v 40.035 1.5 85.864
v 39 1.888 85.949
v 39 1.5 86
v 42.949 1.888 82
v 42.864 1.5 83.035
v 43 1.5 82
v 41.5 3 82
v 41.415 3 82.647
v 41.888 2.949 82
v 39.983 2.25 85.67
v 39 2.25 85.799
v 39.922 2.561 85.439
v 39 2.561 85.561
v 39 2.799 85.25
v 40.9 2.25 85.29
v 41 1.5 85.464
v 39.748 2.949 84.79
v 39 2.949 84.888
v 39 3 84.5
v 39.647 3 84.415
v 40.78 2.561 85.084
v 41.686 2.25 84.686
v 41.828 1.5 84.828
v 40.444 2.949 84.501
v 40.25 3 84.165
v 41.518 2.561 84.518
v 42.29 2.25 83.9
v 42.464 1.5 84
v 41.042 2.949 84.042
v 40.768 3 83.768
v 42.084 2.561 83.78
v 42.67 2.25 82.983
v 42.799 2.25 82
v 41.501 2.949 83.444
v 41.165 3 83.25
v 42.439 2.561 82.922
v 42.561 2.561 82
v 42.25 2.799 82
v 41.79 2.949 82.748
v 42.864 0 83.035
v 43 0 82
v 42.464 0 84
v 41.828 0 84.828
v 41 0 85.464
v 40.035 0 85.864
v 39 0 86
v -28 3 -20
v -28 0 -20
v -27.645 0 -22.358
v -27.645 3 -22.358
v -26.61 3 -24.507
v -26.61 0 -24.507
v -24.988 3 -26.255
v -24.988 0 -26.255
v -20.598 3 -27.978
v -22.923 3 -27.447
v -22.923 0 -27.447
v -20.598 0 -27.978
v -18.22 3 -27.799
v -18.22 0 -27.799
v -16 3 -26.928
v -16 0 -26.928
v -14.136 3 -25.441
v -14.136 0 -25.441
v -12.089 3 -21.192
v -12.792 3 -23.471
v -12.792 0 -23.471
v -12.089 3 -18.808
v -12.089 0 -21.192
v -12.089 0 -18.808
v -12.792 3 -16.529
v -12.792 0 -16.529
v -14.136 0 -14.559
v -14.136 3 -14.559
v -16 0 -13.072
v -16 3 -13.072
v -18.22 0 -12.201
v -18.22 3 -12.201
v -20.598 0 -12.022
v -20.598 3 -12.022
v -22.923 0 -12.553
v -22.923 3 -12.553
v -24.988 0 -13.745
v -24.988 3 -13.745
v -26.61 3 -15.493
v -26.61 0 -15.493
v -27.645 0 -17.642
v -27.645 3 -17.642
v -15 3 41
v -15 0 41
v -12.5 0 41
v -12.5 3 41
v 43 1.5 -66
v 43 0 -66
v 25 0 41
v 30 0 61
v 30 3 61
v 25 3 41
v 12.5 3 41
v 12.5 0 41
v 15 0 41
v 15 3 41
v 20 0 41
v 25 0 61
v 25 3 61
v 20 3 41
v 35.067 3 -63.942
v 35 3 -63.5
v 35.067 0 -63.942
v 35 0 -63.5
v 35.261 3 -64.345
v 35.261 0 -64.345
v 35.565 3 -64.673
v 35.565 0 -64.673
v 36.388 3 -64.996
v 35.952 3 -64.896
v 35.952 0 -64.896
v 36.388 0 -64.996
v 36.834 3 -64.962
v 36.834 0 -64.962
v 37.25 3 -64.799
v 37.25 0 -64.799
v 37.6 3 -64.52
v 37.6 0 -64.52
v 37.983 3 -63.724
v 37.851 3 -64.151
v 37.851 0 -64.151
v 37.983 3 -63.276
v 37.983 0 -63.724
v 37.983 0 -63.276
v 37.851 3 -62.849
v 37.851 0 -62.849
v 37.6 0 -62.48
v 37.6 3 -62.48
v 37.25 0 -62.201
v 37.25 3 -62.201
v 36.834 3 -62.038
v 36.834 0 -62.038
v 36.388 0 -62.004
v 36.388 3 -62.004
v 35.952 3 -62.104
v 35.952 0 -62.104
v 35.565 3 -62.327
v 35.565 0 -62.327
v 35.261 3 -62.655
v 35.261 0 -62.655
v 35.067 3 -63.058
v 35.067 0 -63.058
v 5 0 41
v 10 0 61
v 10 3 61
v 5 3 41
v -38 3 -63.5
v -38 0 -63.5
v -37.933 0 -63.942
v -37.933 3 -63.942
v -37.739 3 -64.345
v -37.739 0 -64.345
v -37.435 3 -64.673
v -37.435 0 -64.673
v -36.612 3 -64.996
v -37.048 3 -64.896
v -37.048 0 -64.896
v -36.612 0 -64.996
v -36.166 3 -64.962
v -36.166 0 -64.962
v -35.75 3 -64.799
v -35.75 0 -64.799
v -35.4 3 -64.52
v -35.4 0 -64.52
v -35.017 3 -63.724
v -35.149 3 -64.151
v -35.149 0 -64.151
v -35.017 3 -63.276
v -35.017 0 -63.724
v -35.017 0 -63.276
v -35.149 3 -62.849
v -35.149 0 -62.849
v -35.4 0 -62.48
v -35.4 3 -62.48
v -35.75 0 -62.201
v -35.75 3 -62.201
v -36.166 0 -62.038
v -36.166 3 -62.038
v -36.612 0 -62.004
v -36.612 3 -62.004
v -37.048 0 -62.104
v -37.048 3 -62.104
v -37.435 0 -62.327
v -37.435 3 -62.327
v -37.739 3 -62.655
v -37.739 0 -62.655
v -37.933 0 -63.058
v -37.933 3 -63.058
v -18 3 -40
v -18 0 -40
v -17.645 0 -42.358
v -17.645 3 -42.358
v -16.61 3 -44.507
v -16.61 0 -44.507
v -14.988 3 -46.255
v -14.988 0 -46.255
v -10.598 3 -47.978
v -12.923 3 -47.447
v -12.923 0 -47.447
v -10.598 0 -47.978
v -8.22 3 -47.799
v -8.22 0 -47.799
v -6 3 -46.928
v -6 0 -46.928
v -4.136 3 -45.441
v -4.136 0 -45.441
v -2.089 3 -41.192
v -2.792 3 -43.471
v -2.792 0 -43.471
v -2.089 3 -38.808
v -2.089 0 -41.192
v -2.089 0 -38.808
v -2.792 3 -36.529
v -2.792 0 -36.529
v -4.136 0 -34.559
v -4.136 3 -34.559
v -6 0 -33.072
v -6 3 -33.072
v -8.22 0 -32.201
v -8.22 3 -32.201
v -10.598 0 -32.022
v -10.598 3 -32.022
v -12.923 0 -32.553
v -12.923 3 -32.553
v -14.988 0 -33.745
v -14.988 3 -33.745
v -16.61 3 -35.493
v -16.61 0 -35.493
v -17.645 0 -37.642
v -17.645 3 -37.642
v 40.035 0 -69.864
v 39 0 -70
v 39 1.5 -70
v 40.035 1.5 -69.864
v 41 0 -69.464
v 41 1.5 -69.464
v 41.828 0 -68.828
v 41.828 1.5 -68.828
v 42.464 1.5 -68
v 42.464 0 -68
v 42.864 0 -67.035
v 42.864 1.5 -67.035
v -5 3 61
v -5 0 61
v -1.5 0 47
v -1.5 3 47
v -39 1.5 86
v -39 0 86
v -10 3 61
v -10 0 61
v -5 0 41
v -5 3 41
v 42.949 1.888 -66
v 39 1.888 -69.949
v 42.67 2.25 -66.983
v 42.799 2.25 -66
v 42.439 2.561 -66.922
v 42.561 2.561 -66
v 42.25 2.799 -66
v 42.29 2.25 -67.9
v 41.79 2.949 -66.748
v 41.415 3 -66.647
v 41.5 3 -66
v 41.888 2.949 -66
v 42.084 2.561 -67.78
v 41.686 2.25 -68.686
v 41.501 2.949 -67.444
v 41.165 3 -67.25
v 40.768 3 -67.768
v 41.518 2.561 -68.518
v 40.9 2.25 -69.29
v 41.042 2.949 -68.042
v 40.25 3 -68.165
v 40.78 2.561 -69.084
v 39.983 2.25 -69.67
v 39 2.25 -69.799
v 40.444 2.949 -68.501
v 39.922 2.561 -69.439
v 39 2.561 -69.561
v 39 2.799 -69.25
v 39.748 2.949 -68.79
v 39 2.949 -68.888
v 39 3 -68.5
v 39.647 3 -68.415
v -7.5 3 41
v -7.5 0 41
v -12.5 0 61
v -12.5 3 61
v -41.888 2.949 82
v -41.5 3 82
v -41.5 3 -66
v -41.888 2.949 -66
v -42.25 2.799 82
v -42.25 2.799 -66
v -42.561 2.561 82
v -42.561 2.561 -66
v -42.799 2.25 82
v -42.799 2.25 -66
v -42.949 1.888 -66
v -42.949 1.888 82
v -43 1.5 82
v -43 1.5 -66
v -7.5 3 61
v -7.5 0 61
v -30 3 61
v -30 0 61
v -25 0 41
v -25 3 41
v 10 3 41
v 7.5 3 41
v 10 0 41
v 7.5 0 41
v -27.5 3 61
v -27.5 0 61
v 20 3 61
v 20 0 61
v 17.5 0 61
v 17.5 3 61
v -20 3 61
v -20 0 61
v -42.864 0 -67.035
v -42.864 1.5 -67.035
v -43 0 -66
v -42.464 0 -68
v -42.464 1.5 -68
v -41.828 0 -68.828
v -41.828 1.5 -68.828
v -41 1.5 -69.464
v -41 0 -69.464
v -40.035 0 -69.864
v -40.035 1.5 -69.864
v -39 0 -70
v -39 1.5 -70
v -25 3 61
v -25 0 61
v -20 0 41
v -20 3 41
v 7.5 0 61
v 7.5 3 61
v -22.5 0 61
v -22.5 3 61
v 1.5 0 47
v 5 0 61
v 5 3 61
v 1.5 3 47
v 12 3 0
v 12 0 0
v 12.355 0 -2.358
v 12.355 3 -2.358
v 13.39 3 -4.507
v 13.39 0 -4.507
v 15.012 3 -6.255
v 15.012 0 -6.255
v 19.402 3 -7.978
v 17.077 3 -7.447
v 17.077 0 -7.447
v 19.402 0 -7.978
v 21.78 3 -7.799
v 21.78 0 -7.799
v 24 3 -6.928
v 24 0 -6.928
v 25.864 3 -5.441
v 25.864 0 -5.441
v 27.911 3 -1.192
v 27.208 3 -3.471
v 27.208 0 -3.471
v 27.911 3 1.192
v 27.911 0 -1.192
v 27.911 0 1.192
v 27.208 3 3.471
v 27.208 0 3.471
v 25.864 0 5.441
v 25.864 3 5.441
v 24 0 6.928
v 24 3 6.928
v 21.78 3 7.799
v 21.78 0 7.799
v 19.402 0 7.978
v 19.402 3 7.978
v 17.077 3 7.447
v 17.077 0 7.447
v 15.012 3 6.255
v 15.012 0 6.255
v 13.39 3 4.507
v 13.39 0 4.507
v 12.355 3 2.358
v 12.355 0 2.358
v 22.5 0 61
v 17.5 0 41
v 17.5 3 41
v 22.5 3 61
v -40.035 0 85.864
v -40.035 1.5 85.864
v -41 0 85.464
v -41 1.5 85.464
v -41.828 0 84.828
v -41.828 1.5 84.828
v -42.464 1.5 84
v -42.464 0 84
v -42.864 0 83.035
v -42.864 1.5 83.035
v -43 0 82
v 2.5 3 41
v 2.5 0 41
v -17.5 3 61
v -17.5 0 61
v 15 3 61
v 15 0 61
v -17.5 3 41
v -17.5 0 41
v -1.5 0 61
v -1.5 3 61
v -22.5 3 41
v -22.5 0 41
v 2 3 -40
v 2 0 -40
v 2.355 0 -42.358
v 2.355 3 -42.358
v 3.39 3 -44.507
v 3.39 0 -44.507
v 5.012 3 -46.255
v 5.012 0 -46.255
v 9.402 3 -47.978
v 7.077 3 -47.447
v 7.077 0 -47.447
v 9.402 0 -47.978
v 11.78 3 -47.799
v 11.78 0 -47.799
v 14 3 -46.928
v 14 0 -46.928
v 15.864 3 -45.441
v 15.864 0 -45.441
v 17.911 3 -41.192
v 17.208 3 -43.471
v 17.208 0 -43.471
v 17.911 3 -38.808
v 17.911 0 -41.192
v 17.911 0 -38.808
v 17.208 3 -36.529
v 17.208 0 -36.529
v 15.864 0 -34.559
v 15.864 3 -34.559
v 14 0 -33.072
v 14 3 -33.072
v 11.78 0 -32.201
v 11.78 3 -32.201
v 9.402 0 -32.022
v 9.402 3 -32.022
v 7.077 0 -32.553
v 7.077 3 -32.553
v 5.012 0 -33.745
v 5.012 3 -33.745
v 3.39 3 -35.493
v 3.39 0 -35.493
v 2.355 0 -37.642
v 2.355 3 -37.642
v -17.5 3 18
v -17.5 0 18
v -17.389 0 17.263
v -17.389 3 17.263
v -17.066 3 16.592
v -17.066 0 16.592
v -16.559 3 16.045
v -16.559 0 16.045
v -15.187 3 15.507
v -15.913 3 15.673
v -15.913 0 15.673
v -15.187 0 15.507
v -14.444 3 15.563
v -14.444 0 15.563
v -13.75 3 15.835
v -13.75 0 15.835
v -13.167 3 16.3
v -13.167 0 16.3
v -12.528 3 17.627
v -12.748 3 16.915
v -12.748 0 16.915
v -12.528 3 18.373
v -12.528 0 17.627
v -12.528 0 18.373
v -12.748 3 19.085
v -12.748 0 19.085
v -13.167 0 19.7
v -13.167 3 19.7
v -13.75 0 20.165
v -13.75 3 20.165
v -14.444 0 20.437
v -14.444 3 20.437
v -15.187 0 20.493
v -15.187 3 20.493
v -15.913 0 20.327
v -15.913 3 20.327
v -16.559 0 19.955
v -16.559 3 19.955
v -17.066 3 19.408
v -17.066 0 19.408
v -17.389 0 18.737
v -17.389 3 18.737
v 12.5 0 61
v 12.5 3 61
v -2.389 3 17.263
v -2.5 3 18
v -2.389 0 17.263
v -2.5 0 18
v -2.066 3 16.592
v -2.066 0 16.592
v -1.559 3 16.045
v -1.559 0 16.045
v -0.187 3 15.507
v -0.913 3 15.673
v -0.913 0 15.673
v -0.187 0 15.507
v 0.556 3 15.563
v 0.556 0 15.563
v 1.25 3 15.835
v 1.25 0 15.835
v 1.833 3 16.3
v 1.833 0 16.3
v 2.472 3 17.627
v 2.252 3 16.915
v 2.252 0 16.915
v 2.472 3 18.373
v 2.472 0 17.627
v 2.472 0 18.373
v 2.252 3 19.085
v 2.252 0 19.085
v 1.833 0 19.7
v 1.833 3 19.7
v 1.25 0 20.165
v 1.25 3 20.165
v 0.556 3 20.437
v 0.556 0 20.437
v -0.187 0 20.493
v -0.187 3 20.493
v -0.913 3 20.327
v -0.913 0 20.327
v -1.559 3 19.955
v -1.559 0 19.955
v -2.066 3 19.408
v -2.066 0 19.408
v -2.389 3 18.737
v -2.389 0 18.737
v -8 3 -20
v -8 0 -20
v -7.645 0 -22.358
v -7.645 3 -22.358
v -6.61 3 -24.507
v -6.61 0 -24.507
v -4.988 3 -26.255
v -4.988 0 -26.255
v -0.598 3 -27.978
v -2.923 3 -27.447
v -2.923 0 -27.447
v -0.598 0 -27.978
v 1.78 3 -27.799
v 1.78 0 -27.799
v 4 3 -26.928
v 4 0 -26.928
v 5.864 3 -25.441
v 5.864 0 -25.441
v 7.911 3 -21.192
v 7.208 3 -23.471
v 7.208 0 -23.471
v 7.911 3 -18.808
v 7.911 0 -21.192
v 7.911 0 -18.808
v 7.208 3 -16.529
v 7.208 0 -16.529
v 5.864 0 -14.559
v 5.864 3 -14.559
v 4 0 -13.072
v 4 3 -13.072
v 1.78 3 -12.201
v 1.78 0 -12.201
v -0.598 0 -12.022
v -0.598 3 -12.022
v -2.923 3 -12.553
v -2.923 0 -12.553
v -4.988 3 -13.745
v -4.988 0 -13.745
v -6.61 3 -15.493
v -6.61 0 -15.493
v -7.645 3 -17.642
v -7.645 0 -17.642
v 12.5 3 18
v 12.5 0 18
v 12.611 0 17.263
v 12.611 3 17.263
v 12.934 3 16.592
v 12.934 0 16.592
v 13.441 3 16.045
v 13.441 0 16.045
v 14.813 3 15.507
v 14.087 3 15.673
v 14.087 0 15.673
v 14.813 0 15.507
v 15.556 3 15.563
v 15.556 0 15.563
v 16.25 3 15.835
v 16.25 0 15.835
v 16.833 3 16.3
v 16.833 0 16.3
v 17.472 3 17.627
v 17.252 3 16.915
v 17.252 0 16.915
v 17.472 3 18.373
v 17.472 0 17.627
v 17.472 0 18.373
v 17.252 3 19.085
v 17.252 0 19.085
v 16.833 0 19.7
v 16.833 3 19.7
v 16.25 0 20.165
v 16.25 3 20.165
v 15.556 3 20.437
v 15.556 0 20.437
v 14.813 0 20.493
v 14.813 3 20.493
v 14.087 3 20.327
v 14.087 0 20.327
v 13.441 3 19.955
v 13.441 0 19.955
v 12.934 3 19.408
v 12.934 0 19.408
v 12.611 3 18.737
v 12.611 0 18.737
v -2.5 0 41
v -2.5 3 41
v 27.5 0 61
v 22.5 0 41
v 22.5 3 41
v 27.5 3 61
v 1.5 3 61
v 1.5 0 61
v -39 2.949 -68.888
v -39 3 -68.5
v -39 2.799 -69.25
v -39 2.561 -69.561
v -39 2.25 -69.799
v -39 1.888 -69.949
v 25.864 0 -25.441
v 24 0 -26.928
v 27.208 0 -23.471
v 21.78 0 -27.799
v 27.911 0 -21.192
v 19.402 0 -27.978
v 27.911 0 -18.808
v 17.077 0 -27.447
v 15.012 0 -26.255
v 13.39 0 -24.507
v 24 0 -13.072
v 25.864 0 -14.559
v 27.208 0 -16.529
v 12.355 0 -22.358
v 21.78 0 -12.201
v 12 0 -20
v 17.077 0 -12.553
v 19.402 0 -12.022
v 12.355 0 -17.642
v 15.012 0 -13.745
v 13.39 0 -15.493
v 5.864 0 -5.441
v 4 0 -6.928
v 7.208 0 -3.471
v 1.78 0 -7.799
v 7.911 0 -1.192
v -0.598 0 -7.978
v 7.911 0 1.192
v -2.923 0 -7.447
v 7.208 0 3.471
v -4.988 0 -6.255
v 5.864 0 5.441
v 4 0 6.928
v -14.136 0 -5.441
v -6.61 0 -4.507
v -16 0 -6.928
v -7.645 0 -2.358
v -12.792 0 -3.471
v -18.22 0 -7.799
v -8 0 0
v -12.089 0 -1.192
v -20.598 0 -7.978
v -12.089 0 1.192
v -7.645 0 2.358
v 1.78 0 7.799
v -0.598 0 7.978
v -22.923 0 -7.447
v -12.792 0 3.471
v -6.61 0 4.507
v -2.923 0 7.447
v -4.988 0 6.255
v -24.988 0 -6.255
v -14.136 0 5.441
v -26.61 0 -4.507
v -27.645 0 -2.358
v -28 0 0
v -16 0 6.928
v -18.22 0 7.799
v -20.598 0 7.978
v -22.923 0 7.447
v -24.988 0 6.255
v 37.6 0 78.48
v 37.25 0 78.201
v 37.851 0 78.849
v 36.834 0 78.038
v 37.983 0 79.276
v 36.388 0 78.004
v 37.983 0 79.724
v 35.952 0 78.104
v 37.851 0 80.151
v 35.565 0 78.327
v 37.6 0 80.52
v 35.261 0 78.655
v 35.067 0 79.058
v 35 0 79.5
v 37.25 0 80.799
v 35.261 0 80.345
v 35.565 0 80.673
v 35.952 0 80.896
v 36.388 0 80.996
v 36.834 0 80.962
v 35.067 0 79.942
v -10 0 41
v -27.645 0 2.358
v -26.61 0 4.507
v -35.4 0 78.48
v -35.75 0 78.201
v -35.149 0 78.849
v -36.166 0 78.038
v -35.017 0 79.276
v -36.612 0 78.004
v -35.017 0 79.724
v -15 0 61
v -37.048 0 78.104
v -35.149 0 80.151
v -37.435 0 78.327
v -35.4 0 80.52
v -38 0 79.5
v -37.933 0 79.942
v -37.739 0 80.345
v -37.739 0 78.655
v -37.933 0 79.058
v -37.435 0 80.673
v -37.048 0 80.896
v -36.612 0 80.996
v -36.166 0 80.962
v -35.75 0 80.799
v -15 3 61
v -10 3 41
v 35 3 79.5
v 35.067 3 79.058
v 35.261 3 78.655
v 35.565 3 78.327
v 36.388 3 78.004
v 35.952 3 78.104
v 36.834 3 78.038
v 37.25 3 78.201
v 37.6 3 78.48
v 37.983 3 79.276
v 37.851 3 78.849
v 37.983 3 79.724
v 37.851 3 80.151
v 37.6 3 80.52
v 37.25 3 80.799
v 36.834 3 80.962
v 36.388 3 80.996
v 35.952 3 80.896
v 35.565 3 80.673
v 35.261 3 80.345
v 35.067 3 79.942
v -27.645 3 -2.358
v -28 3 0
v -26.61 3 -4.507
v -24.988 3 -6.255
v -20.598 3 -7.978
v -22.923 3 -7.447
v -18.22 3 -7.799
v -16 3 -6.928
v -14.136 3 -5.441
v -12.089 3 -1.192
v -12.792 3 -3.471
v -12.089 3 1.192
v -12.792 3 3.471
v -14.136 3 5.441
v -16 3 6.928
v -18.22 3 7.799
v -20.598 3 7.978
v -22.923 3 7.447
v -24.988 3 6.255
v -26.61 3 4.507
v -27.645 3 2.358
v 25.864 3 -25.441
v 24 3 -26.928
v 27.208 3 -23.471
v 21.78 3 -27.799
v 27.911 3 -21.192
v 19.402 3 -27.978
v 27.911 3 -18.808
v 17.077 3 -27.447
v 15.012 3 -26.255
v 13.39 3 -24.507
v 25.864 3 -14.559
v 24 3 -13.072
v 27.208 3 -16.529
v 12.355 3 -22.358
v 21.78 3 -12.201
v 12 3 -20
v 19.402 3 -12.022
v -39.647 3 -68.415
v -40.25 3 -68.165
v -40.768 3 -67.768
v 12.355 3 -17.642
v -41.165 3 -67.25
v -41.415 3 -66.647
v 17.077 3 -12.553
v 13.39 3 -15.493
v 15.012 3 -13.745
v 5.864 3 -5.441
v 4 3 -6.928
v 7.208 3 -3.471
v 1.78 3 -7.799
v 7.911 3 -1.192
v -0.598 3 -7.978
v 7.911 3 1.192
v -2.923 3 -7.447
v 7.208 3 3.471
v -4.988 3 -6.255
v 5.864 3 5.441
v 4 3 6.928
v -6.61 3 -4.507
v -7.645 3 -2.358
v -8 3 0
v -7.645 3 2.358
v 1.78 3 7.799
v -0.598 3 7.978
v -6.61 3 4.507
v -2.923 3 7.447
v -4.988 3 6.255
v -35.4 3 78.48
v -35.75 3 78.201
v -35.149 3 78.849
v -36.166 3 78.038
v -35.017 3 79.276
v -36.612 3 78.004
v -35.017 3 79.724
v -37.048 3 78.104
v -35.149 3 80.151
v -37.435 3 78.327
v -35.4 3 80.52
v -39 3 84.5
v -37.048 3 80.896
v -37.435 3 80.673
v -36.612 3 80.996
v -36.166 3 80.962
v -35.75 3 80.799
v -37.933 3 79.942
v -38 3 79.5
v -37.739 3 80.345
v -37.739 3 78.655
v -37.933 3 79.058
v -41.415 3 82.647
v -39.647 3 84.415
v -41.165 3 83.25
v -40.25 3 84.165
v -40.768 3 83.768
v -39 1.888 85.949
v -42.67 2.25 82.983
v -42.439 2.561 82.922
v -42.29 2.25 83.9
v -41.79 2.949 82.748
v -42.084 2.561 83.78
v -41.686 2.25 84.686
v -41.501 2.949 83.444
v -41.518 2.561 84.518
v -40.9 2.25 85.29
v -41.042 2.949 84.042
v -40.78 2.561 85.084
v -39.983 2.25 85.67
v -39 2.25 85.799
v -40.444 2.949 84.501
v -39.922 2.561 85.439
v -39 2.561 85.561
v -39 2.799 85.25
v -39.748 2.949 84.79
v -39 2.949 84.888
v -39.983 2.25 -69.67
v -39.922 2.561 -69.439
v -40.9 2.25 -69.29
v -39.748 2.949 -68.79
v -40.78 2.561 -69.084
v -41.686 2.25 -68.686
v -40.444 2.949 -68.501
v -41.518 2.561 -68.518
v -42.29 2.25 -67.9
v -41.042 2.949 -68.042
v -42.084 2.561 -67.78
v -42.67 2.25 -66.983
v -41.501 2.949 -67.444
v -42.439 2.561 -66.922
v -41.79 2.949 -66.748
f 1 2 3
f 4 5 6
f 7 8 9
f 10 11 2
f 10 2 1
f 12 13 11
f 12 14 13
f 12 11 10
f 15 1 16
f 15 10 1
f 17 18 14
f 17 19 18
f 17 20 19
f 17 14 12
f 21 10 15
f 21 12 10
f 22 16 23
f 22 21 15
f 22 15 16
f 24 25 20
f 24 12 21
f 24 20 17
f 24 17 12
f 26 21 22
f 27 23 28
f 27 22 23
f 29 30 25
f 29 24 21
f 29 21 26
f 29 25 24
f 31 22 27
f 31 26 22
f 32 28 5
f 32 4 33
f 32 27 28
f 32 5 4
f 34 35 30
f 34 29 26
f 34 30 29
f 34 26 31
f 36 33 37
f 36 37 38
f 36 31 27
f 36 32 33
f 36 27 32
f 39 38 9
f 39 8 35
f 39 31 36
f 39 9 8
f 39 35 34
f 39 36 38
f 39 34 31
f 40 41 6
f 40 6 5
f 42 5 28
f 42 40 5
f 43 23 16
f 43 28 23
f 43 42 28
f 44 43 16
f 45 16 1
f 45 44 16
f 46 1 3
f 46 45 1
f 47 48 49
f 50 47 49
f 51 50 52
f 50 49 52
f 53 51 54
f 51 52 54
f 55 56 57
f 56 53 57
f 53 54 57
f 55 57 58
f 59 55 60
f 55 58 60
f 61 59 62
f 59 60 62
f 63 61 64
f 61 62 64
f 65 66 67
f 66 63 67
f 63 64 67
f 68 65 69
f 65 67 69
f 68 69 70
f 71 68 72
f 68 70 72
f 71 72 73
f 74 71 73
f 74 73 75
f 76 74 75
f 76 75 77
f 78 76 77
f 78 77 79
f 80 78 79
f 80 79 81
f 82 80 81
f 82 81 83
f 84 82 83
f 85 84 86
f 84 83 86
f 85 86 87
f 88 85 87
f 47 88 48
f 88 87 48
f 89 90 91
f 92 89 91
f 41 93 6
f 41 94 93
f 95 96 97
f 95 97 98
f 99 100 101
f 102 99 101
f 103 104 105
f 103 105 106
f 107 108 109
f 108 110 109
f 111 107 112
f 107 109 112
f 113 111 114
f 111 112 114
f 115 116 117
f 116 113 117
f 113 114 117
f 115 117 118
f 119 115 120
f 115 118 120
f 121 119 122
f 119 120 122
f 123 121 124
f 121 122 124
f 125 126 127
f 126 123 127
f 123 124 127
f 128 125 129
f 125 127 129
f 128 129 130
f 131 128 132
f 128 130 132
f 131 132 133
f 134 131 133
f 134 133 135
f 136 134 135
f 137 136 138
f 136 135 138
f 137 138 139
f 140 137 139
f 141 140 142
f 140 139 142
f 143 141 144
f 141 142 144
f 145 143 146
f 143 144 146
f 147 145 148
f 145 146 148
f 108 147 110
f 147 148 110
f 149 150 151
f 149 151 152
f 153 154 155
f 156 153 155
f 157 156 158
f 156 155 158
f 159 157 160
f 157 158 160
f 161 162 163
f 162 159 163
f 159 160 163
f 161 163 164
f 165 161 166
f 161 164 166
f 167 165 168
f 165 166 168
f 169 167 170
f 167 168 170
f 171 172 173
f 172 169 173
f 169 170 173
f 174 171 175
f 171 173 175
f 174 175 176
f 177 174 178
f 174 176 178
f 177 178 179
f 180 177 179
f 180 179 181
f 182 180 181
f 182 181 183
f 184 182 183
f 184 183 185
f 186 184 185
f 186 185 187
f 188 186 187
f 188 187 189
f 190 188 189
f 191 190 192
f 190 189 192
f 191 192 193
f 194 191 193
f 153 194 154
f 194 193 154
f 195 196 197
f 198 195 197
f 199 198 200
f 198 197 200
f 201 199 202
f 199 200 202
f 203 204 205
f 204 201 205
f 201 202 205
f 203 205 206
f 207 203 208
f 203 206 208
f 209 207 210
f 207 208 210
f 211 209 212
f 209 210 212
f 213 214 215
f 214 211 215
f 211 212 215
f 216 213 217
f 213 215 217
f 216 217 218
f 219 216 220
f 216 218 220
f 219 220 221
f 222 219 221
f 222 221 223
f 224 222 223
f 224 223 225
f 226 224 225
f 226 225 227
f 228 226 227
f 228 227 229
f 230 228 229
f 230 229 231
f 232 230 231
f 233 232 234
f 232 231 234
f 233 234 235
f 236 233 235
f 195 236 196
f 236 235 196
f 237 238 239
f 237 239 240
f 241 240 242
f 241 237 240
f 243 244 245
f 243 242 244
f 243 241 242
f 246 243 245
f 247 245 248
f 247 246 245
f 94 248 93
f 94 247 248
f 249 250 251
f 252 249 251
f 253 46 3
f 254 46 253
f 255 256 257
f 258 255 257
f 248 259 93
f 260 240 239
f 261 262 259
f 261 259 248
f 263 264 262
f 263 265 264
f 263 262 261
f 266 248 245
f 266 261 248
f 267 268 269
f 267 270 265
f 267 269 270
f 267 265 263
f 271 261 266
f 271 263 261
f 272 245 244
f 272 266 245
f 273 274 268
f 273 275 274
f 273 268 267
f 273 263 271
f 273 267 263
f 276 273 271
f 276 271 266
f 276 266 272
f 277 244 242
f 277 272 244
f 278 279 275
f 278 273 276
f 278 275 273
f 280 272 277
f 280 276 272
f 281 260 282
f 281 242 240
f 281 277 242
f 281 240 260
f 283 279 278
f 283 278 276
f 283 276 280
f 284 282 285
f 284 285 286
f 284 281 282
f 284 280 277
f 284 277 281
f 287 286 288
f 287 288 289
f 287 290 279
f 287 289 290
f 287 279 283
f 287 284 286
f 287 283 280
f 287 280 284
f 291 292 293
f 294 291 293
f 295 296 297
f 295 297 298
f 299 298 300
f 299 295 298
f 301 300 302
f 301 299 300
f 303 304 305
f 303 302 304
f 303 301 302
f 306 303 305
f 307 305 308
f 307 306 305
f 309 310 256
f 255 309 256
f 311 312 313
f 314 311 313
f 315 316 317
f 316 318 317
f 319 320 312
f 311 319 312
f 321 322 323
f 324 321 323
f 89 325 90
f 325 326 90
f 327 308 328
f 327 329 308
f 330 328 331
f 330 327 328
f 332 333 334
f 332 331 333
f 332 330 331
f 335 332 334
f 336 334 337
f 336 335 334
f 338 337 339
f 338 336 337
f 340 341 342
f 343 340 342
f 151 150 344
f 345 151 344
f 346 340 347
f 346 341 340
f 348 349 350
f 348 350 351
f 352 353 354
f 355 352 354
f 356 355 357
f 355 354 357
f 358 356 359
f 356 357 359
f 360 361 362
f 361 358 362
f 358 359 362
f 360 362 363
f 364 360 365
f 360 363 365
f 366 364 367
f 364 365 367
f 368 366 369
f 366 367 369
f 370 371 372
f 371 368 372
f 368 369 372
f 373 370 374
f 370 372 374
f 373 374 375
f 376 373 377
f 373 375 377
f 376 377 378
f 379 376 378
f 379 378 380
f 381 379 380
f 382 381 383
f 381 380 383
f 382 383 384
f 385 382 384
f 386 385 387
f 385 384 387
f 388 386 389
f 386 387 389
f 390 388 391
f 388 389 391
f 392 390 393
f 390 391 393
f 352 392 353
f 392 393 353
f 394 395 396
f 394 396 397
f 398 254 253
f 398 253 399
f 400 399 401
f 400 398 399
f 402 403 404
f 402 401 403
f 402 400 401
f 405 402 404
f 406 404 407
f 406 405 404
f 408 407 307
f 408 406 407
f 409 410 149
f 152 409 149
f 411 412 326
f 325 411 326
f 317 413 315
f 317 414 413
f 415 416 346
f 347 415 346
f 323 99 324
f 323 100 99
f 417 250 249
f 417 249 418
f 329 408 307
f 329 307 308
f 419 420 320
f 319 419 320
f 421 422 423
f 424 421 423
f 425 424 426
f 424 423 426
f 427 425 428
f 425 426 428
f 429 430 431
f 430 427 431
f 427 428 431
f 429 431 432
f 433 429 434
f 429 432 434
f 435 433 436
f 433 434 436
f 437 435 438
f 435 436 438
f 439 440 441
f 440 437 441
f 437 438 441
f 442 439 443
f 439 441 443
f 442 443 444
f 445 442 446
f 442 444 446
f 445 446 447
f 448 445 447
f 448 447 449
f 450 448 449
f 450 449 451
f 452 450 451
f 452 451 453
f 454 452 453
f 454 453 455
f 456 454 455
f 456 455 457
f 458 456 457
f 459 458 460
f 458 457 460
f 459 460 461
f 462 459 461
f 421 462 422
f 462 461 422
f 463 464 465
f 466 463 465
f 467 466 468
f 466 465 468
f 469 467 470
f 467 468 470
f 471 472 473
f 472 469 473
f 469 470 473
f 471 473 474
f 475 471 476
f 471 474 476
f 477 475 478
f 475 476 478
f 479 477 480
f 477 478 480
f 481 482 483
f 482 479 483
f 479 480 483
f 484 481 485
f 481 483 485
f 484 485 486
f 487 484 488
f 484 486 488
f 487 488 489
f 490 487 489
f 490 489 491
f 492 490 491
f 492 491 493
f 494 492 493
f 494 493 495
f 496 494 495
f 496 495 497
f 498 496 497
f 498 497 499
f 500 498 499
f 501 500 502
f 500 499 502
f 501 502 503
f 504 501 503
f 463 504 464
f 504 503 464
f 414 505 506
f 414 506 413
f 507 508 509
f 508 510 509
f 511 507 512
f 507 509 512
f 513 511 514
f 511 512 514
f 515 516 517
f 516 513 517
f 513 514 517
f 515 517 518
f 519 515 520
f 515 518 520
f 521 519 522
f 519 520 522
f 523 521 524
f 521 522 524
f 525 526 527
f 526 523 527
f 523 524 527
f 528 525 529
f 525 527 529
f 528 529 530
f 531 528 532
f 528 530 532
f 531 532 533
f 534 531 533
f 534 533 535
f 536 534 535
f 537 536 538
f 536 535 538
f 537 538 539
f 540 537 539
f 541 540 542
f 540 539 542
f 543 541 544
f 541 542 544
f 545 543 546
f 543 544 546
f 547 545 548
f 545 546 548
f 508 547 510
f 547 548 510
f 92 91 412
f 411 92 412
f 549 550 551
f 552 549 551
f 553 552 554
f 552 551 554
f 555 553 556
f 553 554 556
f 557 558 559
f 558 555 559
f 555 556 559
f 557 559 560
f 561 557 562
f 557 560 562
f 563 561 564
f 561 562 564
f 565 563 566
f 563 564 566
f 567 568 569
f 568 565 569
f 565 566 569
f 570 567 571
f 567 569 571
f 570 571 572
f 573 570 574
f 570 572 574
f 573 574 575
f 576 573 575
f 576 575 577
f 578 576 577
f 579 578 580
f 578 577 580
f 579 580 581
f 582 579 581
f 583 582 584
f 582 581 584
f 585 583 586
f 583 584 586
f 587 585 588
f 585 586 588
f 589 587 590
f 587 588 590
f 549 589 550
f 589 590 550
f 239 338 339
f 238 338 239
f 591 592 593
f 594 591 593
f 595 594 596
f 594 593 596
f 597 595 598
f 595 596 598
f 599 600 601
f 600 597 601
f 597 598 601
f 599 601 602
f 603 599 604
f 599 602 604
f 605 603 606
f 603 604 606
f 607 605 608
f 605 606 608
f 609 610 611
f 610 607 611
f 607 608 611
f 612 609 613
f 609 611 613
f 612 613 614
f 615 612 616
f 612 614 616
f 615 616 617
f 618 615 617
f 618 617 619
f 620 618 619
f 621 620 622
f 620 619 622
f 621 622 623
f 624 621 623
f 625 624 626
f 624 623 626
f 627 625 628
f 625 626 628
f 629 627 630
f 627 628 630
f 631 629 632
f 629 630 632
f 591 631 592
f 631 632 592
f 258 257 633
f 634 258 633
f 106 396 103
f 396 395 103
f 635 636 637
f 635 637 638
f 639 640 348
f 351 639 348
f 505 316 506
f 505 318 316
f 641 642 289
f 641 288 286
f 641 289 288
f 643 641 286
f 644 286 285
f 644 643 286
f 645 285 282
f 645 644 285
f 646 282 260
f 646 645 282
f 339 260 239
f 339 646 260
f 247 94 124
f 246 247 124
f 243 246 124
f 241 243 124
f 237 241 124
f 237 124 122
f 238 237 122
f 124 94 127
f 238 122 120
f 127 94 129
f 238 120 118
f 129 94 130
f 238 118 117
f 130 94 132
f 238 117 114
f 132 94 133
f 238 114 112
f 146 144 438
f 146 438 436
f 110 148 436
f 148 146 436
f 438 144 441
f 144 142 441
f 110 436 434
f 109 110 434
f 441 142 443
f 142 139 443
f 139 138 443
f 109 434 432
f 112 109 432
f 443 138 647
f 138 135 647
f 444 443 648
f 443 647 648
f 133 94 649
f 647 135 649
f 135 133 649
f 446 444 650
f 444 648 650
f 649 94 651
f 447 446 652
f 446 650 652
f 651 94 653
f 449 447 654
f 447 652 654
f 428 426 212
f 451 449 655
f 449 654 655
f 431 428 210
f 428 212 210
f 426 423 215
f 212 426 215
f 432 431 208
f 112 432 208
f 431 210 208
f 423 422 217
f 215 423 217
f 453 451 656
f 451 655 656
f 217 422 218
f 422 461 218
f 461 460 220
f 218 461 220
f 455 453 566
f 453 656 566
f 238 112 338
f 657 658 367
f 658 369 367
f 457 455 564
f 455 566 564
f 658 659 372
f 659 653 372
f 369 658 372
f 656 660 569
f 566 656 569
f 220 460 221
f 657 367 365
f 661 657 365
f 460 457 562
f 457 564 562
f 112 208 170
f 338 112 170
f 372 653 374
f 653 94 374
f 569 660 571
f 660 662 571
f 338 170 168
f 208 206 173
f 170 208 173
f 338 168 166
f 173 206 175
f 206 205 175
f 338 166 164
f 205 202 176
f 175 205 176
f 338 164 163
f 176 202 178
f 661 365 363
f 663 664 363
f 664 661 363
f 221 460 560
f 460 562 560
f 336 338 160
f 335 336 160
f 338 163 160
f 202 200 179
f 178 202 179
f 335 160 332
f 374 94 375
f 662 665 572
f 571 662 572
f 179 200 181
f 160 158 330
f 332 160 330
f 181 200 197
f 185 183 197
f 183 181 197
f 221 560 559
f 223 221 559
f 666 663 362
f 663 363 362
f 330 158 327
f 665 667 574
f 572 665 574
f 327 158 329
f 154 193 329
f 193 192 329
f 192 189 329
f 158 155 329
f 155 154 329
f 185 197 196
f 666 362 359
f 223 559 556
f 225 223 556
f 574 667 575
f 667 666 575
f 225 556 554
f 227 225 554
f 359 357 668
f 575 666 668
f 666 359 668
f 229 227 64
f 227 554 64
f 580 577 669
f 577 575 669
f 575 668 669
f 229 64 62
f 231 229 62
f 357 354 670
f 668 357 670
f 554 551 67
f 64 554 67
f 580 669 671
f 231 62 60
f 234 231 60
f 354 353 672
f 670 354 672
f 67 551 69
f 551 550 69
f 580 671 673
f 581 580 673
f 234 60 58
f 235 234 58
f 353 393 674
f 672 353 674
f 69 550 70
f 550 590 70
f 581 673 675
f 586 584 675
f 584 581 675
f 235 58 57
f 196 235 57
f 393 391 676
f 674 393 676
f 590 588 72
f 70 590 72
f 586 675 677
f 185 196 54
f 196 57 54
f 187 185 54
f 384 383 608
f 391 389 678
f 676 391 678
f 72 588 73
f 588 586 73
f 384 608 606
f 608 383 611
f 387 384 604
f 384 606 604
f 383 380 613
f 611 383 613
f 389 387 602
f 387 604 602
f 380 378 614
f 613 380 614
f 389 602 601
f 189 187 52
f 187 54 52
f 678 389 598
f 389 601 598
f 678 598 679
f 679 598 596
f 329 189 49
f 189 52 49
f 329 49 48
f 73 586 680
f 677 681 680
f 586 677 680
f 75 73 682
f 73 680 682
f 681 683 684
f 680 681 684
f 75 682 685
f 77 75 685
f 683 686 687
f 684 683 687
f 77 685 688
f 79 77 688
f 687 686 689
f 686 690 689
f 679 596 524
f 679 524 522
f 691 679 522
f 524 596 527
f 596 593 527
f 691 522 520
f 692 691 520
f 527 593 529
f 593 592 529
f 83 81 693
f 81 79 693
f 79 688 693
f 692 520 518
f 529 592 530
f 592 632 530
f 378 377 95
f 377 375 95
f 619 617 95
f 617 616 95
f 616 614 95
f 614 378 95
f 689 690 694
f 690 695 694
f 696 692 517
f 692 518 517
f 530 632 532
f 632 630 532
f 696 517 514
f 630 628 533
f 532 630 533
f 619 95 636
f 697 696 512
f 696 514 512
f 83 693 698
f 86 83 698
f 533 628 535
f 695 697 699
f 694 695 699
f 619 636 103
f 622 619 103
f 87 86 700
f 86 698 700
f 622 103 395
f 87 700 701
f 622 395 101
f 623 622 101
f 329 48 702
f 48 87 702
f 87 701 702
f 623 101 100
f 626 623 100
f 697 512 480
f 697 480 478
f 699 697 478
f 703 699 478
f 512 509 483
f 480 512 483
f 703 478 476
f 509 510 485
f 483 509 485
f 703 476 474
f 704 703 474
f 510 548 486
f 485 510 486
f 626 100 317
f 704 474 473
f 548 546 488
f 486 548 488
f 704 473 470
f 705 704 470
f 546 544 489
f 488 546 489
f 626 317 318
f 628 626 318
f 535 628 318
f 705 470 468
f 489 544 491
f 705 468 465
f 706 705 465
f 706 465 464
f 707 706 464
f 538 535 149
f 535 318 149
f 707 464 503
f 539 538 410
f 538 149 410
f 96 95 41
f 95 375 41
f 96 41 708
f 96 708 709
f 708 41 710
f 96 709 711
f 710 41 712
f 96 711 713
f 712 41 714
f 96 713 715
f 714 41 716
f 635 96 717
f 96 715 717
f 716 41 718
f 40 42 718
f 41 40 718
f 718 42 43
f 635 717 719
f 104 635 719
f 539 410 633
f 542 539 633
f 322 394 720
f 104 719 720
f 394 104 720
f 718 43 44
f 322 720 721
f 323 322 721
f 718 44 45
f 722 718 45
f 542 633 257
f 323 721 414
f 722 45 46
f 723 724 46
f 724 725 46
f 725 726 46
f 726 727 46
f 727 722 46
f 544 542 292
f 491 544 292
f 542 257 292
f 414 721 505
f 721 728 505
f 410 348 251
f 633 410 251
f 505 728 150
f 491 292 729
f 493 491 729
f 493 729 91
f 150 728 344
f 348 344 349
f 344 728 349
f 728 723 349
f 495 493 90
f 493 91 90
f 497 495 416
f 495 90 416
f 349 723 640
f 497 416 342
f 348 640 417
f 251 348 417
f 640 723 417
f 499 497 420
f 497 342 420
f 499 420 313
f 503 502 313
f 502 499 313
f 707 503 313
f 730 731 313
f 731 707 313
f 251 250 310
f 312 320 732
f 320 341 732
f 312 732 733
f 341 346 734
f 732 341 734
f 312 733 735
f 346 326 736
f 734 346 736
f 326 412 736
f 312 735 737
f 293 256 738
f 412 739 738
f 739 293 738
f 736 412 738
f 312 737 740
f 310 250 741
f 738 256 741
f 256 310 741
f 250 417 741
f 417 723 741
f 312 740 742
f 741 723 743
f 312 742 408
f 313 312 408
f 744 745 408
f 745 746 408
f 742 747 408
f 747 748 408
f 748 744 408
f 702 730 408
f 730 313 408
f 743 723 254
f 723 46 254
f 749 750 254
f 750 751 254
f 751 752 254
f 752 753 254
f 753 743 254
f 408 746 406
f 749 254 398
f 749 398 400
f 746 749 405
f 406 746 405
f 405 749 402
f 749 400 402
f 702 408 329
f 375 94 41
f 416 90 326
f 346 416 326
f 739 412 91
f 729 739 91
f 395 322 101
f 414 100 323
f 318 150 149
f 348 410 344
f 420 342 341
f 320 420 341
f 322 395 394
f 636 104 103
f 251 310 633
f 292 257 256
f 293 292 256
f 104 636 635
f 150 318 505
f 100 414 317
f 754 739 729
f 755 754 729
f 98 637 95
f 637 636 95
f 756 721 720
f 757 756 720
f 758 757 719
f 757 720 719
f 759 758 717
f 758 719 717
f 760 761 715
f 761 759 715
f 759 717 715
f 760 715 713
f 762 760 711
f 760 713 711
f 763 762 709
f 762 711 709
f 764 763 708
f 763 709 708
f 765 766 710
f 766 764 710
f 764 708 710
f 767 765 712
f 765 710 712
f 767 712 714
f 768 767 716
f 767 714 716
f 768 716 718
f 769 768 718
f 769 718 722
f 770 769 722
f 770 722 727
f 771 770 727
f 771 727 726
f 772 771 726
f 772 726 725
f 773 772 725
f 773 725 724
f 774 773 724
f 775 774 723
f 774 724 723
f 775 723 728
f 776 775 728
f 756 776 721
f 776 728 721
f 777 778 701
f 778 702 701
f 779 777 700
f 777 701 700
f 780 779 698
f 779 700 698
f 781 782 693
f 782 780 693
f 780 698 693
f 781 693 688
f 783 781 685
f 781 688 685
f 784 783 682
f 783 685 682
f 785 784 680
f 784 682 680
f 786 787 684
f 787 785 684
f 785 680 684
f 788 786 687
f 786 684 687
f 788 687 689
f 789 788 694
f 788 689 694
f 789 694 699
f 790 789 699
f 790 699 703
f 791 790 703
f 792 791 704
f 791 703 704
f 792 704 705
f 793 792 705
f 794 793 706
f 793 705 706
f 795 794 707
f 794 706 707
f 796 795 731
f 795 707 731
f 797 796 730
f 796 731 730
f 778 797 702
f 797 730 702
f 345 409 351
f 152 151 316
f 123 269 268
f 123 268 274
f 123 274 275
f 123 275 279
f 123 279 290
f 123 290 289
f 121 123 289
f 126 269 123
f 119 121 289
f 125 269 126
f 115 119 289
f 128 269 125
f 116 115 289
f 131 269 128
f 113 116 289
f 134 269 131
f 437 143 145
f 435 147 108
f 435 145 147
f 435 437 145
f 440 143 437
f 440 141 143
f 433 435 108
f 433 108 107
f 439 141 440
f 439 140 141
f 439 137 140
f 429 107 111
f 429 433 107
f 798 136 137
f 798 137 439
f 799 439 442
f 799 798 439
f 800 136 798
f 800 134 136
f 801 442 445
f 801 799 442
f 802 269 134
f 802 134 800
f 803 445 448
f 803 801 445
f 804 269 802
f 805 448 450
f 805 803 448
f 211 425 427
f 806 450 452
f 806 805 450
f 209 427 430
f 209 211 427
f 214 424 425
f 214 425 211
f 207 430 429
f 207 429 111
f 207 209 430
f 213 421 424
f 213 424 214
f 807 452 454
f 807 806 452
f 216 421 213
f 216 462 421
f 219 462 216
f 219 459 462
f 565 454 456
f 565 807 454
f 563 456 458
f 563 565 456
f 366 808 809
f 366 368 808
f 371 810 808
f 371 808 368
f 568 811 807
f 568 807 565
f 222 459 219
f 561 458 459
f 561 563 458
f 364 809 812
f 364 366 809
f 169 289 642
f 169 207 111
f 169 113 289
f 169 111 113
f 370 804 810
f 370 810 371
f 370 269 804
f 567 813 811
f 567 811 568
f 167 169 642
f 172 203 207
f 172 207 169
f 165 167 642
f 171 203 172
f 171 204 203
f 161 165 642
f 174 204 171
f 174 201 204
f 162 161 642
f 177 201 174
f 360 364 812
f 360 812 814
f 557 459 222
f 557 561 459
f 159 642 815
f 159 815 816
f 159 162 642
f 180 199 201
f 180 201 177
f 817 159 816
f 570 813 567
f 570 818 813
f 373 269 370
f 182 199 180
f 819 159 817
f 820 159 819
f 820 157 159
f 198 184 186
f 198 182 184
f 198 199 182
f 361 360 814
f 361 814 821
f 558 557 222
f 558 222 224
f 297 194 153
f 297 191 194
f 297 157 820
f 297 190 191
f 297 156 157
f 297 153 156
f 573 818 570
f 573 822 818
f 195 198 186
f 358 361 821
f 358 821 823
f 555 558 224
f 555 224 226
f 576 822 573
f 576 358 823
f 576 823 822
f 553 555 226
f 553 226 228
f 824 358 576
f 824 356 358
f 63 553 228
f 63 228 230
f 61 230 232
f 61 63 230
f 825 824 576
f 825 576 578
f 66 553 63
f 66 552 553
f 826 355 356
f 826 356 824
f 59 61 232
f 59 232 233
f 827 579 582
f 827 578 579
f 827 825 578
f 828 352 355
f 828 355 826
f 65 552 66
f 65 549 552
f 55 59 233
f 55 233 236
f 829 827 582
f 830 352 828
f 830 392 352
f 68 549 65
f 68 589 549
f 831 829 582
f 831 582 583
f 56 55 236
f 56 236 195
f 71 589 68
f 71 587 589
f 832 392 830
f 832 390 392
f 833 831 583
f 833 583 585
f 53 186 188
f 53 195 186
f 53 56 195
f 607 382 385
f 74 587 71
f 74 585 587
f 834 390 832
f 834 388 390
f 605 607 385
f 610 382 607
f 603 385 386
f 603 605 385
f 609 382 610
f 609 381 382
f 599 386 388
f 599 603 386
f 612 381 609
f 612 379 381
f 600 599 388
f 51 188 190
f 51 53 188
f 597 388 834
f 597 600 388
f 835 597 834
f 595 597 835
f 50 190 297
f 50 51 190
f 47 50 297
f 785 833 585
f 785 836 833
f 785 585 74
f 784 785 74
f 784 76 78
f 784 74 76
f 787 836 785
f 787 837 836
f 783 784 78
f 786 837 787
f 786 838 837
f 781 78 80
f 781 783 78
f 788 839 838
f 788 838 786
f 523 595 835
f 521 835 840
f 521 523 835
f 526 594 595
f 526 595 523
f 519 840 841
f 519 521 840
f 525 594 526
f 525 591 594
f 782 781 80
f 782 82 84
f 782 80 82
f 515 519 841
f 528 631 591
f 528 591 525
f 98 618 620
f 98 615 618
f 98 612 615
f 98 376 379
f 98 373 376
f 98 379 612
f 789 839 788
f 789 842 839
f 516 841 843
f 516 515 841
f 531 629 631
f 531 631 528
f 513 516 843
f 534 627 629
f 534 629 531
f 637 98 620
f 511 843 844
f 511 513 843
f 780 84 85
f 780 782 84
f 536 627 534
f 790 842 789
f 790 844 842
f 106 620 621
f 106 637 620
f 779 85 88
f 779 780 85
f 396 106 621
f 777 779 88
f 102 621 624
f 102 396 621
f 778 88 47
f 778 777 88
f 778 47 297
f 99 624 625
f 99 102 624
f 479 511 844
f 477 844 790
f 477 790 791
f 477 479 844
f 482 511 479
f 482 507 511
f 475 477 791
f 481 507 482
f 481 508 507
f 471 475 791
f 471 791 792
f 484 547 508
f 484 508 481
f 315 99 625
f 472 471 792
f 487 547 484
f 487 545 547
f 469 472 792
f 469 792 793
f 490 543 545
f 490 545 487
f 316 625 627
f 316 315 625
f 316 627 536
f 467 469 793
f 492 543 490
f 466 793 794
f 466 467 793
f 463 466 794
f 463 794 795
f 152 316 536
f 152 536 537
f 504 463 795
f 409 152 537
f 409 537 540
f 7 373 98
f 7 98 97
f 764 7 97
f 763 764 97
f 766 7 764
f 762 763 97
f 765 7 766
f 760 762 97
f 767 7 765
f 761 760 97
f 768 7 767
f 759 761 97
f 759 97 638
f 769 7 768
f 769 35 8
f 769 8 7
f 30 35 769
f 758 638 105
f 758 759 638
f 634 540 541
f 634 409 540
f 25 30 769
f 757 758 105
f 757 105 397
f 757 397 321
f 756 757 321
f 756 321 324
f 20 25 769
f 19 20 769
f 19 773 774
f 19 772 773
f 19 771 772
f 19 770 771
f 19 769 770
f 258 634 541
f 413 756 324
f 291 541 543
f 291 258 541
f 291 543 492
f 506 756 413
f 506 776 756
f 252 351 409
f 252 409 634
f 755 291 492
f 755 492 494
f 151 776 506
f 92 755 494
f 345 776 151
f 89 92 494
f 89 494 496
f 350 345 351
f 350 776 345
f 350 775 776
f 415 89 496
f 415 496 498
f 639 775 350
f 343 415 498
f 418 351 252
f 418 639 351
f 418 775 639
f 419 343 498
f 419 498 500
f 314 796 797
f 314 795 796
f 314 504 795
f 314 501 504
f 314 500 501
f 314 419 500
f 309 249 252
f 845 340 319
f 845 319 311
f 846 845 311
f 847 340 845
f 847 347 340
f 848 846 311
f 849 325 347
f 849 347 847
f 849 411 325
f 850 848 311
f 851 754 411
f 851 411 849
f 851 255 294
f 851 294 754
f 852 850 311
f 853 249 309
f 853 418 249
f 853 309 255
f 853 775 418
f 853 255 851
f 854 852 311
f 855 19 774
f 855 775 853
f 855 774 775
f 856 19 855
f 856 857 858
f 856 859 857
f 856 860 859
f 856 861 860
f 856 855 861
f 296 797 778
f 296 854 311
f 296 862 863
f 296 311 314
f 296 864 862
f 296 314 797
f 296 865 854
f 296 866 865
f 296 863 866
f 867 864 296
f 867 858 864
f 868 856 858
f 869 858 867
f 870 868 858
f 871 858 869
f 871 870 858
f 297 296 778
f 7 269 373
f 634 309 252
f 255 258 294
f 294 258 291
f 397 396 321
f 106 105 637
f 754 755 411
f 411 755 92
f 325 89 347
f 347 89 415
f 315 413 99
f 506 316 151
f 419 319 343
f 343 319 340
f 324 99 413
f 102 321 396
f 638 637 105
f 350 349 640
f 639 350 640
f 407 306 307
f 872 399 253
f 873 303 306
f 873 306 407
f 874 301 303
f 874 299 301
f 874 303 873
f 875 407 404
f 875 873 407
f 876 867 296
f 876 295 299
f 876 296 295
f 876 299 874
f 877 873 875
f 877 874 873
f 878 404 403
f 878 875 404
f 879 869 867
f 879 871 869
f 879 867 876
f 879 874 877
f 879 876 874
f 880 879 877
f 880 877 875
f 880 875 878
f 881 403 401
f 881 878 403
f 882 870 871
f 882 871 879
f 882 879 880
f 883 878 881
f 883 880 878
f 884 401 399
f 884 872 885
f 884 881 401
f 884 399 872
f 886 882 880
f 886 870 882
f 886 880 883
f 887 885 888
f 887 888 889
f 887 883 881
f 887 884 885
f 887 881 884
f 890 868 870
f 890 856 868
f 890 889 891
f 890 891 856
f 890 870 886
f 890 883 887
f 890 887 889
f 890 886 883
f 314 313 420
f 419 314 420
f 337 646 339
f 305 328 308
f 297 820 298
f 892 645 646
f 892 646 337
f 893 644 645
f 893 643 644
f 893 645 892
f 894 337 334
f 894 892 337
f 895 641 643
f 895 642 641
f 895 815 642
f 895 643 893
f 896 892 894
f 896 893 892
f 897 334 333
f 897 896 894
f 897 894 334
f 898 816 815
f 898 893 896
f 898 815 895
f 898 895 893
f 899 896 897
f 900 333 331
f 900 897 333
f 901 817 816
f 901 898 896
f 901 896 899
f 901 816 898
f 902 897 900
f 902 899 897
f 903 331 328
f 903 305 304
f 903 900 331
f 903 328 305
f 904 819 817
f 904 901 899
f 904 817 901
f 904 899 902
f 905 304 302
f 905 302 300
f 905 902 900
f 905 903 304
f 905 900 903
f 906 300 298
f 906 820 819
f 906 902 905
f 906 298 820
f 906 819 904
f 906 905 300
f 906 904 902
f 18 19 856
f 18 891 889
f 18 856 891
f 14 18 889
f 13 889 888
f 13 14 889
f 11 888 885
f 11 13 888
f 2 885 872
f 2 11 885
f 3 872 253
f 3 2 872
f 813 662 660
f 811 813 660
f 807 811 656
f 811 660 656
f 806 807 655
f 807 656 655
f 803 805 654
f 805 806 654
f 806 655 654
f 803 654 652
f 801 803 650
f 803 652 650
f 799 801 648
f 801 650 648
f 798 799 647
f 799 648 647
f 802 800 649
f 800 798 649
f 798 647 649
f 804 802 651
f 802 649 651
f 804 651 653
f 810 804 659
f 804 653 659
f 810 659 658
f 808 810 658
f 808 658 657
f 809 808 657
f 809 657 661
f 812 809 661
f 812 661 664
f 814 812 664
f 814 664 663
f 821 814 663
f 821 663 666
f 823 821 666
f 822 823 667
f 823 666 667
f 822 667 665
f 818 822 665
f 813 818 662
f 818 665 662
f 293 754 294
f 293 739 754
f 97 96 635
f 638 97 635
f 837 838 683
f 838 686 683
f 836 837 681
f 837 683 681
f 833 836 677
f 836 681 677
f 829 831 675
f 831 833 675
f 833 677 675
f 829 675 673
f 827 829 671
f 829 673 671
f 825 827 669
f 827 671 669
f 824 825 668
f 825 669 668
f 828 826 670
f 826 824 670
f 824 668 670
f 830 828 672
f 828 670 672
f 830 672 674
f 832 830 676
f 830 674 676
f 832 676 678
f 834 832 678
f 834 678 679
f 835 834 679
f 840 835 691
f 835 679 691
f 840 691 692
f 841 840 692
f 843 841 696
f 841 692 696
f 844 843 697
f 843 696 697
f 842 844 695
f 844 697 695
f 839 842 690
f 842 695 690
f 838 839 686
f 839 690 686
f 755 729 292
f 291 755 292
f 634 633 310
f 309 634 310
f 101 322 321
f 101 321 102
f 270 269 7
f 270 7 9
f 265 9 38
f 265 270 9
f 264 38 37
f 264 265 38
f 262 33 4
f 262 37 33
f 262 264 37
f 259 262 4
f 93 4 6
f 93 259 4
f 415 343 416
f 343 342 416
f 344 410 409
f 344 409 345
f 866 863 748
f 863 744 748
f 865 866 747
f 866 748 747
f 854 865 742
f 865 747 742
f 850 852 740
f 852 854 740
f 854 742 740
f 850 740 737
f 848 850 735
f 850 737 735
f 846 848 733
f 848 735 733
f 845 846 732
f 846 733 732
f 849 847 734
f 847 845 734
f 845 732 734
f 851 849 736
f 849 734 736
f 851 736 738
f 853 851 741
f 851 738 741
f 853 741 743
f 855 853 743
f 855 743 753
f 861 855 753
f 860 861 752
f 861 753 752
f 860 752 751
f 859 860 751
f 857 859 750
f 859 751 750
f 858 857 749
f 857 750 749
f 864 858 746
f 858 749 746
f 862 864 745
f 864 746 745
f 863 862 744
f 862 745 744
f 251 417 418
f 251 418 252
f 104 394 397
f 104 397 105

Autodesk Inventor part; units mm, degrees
ref_plane "YZ Plane" through (0, 0, 0) normal (1, 0, 0) x (0, 1, 0)
ref_plane "XZ Plane" through (0, 0, 0) normal (0, 1, 0) x (-1, 0, 0)
ref_plane "XY Plane" through (0, 0, 0) normal (0, 0, 1) x (1, 0, 0)
sketch "Sketch2" plane through (0, 0, 0) normal (0, 1, 0) x (-1, 0, 0)
  line L0 (-39, 86) -> (39, 86)
  arc A0 (43, 82) -> (39, 86) centre (39, 82) ccw
  line L1 (43, 82) -> (43, -66)
  arc A1 (39, -70) -> (43, -66) centre (39, -66) ccw
  line L2 (39, -70) -> (-39, -70)
  arc A2 (-43, -66) -> (-39, -70) centre (-39, -66) ccw
  line L3 (-43, -66) -> (-43, 82)
  arc A3 (-39, 86) -> (-43, 82) centre (-39, 82) ccw
  circle A4 centre (-36.5, 79.5) radius 1.5
  circle A5 centre (36.5, 79.5) radius 1.5
  circle A6 centre (-36.5, -63.5) radius 1.5
  circle A7 centre (36.5, -63.5) radius 1.5
  line L4 (-30, 61) -> (-27.5, 61)
  line L5 (-30, 61) -> (-25, 41)
  line L6 (-25, 61) -> (-20, 41)
  line L7 (-20, 61) -> (-15, 41)
  line L8 (-15, 61) -> (-10, 41)
  line L9 (-10, 61) -> (-5, 41)
  line L10 (-5, 61) -> (-1.5, 47)
  line L11 (30, 61) -> (25, 41)
  line L12 (25, 61) -> (20, 41)
  line L13 (20, 61) -> (15, 41)
  line L14 (15, 61) -> (10, 41)
  line L15 (10, 61) -> (5, 41)
  line L16 (5, 61) -> (1.5, 47)
  line L17 (-20, 61) -> (-17.5, 61)
  line L18 (-22.5, 41) -> (-25, 41)
  line L19 (-10, 61) -> (-7.5, 61)
  line L20 (-12.5, 41) -> (-15, 41)
  line L21 (25, 41) -> (22.5, 41)
  line L22 (27.5, 61) -> (30, 61)
  line L23 (15, 41) -> (12.5, 41)
  line L24 (17.5, 61) -> (20, 61)
  line L25 (7.5, 61) -> (10, 61)
  line L26 (22.5, 41) -> (27.5, 61)
  line L27 (20, 41) -> (17.5, 41)
  line L28 (25, 61) -> (22.5, 61)
  line L29 (17.5, 41) -> (22.5, 61)
  line L30 (12.5, 41) -> (17.5, 61)
  line L31 (15, 61) -> (12.5, 61)
  line L32 (10, 41) -> (7.5, 41)
  line L33 (7.5, 41) -> (12.5, 61)
  line L34 (-22.5, 41) -> (-27.5, 61)
  line L35 (-12.5, 41) -> (-17.5, 61)
  line L36 (-22.5, 61) -> (-25, 61)
  line L37 (-17.5, 41) -> (-20, 41)
  line L38 (-17.5, 41) -> (-22.5, 61)
  line L39 (-7.5, 41) -> (-10, 41)
  line L40 (-12.5, 61) -> (-15, 61)
  line L41 (-7.5, 41) -> (-12.5, 61)
  line L42 (2.5, 41) -> (7.5, 61)
  line L43 (-2.5, 41) -> (-7.5, 61)
  line L44 (5, 41) -> (2.5, 41)
  line L45 (-2.5, 41) -> (-5, 41)
  line L46 (5, 61) -> (1.5, 61)
  line L47 (1.5, 61) -> (1.5, 47)
  line L48 (-5, 61) -> (-1.5, 61)
  line L49 (-1.5, 61) -> (-1.5, 47)
  circle A8 centre (15, 18) radius 2.5
  circle A9 centre (0, 18) radius 2.5
  circle A10 centre (-15, 18) radius 2.5
  circle A11 centre (10, -40) radius 8
  circle A12 centre (-10, -40) radius 8
  circle A13 centre (20, -20) radius 8
  circle A14 centre (0, -20) radius 8
  circle A15 centre (-20, -20) radius 8
  circle A16 centre (20, 0) radius 8
  circle A17 centre (0, 0) radius 8
  circle A18 centre (-20, 0) radius 8
  point P0 (-43, -66)
  point P1 (39, -70)
  point P2 (43, 82)
  dimension "d6" = 3.5
  dimension "d7" = 3.5
  dimension "d8" = 90
  dimension "d10" = 5
  dimension "d11" = 5
  dimension "d12" = 5
  dimension "d13" = 16
  dimension "d14" = 16
  dimension "d15" = 16
  dimension "d16" = 16
  dimension "d17" = 16
  dimension "d18" = 16
  dimension "d19" = 16
  dimension "d20" = 16
extrude "Extrusion2" add sketch "Sketch2" along normal blind 3
fillet "Fillet2" radius 1.5 8 edges at (41.8284, 3, -68.8284) (0, 3, -70) (-41.8284, 3, -68.8284) (-43, 3, 8) (-41.8284, 3, 84.8284) (0, 3, 86) (41.8284, 3, 84.8284) (43, 3, 8)
properties part number "TUTUP CASING"
